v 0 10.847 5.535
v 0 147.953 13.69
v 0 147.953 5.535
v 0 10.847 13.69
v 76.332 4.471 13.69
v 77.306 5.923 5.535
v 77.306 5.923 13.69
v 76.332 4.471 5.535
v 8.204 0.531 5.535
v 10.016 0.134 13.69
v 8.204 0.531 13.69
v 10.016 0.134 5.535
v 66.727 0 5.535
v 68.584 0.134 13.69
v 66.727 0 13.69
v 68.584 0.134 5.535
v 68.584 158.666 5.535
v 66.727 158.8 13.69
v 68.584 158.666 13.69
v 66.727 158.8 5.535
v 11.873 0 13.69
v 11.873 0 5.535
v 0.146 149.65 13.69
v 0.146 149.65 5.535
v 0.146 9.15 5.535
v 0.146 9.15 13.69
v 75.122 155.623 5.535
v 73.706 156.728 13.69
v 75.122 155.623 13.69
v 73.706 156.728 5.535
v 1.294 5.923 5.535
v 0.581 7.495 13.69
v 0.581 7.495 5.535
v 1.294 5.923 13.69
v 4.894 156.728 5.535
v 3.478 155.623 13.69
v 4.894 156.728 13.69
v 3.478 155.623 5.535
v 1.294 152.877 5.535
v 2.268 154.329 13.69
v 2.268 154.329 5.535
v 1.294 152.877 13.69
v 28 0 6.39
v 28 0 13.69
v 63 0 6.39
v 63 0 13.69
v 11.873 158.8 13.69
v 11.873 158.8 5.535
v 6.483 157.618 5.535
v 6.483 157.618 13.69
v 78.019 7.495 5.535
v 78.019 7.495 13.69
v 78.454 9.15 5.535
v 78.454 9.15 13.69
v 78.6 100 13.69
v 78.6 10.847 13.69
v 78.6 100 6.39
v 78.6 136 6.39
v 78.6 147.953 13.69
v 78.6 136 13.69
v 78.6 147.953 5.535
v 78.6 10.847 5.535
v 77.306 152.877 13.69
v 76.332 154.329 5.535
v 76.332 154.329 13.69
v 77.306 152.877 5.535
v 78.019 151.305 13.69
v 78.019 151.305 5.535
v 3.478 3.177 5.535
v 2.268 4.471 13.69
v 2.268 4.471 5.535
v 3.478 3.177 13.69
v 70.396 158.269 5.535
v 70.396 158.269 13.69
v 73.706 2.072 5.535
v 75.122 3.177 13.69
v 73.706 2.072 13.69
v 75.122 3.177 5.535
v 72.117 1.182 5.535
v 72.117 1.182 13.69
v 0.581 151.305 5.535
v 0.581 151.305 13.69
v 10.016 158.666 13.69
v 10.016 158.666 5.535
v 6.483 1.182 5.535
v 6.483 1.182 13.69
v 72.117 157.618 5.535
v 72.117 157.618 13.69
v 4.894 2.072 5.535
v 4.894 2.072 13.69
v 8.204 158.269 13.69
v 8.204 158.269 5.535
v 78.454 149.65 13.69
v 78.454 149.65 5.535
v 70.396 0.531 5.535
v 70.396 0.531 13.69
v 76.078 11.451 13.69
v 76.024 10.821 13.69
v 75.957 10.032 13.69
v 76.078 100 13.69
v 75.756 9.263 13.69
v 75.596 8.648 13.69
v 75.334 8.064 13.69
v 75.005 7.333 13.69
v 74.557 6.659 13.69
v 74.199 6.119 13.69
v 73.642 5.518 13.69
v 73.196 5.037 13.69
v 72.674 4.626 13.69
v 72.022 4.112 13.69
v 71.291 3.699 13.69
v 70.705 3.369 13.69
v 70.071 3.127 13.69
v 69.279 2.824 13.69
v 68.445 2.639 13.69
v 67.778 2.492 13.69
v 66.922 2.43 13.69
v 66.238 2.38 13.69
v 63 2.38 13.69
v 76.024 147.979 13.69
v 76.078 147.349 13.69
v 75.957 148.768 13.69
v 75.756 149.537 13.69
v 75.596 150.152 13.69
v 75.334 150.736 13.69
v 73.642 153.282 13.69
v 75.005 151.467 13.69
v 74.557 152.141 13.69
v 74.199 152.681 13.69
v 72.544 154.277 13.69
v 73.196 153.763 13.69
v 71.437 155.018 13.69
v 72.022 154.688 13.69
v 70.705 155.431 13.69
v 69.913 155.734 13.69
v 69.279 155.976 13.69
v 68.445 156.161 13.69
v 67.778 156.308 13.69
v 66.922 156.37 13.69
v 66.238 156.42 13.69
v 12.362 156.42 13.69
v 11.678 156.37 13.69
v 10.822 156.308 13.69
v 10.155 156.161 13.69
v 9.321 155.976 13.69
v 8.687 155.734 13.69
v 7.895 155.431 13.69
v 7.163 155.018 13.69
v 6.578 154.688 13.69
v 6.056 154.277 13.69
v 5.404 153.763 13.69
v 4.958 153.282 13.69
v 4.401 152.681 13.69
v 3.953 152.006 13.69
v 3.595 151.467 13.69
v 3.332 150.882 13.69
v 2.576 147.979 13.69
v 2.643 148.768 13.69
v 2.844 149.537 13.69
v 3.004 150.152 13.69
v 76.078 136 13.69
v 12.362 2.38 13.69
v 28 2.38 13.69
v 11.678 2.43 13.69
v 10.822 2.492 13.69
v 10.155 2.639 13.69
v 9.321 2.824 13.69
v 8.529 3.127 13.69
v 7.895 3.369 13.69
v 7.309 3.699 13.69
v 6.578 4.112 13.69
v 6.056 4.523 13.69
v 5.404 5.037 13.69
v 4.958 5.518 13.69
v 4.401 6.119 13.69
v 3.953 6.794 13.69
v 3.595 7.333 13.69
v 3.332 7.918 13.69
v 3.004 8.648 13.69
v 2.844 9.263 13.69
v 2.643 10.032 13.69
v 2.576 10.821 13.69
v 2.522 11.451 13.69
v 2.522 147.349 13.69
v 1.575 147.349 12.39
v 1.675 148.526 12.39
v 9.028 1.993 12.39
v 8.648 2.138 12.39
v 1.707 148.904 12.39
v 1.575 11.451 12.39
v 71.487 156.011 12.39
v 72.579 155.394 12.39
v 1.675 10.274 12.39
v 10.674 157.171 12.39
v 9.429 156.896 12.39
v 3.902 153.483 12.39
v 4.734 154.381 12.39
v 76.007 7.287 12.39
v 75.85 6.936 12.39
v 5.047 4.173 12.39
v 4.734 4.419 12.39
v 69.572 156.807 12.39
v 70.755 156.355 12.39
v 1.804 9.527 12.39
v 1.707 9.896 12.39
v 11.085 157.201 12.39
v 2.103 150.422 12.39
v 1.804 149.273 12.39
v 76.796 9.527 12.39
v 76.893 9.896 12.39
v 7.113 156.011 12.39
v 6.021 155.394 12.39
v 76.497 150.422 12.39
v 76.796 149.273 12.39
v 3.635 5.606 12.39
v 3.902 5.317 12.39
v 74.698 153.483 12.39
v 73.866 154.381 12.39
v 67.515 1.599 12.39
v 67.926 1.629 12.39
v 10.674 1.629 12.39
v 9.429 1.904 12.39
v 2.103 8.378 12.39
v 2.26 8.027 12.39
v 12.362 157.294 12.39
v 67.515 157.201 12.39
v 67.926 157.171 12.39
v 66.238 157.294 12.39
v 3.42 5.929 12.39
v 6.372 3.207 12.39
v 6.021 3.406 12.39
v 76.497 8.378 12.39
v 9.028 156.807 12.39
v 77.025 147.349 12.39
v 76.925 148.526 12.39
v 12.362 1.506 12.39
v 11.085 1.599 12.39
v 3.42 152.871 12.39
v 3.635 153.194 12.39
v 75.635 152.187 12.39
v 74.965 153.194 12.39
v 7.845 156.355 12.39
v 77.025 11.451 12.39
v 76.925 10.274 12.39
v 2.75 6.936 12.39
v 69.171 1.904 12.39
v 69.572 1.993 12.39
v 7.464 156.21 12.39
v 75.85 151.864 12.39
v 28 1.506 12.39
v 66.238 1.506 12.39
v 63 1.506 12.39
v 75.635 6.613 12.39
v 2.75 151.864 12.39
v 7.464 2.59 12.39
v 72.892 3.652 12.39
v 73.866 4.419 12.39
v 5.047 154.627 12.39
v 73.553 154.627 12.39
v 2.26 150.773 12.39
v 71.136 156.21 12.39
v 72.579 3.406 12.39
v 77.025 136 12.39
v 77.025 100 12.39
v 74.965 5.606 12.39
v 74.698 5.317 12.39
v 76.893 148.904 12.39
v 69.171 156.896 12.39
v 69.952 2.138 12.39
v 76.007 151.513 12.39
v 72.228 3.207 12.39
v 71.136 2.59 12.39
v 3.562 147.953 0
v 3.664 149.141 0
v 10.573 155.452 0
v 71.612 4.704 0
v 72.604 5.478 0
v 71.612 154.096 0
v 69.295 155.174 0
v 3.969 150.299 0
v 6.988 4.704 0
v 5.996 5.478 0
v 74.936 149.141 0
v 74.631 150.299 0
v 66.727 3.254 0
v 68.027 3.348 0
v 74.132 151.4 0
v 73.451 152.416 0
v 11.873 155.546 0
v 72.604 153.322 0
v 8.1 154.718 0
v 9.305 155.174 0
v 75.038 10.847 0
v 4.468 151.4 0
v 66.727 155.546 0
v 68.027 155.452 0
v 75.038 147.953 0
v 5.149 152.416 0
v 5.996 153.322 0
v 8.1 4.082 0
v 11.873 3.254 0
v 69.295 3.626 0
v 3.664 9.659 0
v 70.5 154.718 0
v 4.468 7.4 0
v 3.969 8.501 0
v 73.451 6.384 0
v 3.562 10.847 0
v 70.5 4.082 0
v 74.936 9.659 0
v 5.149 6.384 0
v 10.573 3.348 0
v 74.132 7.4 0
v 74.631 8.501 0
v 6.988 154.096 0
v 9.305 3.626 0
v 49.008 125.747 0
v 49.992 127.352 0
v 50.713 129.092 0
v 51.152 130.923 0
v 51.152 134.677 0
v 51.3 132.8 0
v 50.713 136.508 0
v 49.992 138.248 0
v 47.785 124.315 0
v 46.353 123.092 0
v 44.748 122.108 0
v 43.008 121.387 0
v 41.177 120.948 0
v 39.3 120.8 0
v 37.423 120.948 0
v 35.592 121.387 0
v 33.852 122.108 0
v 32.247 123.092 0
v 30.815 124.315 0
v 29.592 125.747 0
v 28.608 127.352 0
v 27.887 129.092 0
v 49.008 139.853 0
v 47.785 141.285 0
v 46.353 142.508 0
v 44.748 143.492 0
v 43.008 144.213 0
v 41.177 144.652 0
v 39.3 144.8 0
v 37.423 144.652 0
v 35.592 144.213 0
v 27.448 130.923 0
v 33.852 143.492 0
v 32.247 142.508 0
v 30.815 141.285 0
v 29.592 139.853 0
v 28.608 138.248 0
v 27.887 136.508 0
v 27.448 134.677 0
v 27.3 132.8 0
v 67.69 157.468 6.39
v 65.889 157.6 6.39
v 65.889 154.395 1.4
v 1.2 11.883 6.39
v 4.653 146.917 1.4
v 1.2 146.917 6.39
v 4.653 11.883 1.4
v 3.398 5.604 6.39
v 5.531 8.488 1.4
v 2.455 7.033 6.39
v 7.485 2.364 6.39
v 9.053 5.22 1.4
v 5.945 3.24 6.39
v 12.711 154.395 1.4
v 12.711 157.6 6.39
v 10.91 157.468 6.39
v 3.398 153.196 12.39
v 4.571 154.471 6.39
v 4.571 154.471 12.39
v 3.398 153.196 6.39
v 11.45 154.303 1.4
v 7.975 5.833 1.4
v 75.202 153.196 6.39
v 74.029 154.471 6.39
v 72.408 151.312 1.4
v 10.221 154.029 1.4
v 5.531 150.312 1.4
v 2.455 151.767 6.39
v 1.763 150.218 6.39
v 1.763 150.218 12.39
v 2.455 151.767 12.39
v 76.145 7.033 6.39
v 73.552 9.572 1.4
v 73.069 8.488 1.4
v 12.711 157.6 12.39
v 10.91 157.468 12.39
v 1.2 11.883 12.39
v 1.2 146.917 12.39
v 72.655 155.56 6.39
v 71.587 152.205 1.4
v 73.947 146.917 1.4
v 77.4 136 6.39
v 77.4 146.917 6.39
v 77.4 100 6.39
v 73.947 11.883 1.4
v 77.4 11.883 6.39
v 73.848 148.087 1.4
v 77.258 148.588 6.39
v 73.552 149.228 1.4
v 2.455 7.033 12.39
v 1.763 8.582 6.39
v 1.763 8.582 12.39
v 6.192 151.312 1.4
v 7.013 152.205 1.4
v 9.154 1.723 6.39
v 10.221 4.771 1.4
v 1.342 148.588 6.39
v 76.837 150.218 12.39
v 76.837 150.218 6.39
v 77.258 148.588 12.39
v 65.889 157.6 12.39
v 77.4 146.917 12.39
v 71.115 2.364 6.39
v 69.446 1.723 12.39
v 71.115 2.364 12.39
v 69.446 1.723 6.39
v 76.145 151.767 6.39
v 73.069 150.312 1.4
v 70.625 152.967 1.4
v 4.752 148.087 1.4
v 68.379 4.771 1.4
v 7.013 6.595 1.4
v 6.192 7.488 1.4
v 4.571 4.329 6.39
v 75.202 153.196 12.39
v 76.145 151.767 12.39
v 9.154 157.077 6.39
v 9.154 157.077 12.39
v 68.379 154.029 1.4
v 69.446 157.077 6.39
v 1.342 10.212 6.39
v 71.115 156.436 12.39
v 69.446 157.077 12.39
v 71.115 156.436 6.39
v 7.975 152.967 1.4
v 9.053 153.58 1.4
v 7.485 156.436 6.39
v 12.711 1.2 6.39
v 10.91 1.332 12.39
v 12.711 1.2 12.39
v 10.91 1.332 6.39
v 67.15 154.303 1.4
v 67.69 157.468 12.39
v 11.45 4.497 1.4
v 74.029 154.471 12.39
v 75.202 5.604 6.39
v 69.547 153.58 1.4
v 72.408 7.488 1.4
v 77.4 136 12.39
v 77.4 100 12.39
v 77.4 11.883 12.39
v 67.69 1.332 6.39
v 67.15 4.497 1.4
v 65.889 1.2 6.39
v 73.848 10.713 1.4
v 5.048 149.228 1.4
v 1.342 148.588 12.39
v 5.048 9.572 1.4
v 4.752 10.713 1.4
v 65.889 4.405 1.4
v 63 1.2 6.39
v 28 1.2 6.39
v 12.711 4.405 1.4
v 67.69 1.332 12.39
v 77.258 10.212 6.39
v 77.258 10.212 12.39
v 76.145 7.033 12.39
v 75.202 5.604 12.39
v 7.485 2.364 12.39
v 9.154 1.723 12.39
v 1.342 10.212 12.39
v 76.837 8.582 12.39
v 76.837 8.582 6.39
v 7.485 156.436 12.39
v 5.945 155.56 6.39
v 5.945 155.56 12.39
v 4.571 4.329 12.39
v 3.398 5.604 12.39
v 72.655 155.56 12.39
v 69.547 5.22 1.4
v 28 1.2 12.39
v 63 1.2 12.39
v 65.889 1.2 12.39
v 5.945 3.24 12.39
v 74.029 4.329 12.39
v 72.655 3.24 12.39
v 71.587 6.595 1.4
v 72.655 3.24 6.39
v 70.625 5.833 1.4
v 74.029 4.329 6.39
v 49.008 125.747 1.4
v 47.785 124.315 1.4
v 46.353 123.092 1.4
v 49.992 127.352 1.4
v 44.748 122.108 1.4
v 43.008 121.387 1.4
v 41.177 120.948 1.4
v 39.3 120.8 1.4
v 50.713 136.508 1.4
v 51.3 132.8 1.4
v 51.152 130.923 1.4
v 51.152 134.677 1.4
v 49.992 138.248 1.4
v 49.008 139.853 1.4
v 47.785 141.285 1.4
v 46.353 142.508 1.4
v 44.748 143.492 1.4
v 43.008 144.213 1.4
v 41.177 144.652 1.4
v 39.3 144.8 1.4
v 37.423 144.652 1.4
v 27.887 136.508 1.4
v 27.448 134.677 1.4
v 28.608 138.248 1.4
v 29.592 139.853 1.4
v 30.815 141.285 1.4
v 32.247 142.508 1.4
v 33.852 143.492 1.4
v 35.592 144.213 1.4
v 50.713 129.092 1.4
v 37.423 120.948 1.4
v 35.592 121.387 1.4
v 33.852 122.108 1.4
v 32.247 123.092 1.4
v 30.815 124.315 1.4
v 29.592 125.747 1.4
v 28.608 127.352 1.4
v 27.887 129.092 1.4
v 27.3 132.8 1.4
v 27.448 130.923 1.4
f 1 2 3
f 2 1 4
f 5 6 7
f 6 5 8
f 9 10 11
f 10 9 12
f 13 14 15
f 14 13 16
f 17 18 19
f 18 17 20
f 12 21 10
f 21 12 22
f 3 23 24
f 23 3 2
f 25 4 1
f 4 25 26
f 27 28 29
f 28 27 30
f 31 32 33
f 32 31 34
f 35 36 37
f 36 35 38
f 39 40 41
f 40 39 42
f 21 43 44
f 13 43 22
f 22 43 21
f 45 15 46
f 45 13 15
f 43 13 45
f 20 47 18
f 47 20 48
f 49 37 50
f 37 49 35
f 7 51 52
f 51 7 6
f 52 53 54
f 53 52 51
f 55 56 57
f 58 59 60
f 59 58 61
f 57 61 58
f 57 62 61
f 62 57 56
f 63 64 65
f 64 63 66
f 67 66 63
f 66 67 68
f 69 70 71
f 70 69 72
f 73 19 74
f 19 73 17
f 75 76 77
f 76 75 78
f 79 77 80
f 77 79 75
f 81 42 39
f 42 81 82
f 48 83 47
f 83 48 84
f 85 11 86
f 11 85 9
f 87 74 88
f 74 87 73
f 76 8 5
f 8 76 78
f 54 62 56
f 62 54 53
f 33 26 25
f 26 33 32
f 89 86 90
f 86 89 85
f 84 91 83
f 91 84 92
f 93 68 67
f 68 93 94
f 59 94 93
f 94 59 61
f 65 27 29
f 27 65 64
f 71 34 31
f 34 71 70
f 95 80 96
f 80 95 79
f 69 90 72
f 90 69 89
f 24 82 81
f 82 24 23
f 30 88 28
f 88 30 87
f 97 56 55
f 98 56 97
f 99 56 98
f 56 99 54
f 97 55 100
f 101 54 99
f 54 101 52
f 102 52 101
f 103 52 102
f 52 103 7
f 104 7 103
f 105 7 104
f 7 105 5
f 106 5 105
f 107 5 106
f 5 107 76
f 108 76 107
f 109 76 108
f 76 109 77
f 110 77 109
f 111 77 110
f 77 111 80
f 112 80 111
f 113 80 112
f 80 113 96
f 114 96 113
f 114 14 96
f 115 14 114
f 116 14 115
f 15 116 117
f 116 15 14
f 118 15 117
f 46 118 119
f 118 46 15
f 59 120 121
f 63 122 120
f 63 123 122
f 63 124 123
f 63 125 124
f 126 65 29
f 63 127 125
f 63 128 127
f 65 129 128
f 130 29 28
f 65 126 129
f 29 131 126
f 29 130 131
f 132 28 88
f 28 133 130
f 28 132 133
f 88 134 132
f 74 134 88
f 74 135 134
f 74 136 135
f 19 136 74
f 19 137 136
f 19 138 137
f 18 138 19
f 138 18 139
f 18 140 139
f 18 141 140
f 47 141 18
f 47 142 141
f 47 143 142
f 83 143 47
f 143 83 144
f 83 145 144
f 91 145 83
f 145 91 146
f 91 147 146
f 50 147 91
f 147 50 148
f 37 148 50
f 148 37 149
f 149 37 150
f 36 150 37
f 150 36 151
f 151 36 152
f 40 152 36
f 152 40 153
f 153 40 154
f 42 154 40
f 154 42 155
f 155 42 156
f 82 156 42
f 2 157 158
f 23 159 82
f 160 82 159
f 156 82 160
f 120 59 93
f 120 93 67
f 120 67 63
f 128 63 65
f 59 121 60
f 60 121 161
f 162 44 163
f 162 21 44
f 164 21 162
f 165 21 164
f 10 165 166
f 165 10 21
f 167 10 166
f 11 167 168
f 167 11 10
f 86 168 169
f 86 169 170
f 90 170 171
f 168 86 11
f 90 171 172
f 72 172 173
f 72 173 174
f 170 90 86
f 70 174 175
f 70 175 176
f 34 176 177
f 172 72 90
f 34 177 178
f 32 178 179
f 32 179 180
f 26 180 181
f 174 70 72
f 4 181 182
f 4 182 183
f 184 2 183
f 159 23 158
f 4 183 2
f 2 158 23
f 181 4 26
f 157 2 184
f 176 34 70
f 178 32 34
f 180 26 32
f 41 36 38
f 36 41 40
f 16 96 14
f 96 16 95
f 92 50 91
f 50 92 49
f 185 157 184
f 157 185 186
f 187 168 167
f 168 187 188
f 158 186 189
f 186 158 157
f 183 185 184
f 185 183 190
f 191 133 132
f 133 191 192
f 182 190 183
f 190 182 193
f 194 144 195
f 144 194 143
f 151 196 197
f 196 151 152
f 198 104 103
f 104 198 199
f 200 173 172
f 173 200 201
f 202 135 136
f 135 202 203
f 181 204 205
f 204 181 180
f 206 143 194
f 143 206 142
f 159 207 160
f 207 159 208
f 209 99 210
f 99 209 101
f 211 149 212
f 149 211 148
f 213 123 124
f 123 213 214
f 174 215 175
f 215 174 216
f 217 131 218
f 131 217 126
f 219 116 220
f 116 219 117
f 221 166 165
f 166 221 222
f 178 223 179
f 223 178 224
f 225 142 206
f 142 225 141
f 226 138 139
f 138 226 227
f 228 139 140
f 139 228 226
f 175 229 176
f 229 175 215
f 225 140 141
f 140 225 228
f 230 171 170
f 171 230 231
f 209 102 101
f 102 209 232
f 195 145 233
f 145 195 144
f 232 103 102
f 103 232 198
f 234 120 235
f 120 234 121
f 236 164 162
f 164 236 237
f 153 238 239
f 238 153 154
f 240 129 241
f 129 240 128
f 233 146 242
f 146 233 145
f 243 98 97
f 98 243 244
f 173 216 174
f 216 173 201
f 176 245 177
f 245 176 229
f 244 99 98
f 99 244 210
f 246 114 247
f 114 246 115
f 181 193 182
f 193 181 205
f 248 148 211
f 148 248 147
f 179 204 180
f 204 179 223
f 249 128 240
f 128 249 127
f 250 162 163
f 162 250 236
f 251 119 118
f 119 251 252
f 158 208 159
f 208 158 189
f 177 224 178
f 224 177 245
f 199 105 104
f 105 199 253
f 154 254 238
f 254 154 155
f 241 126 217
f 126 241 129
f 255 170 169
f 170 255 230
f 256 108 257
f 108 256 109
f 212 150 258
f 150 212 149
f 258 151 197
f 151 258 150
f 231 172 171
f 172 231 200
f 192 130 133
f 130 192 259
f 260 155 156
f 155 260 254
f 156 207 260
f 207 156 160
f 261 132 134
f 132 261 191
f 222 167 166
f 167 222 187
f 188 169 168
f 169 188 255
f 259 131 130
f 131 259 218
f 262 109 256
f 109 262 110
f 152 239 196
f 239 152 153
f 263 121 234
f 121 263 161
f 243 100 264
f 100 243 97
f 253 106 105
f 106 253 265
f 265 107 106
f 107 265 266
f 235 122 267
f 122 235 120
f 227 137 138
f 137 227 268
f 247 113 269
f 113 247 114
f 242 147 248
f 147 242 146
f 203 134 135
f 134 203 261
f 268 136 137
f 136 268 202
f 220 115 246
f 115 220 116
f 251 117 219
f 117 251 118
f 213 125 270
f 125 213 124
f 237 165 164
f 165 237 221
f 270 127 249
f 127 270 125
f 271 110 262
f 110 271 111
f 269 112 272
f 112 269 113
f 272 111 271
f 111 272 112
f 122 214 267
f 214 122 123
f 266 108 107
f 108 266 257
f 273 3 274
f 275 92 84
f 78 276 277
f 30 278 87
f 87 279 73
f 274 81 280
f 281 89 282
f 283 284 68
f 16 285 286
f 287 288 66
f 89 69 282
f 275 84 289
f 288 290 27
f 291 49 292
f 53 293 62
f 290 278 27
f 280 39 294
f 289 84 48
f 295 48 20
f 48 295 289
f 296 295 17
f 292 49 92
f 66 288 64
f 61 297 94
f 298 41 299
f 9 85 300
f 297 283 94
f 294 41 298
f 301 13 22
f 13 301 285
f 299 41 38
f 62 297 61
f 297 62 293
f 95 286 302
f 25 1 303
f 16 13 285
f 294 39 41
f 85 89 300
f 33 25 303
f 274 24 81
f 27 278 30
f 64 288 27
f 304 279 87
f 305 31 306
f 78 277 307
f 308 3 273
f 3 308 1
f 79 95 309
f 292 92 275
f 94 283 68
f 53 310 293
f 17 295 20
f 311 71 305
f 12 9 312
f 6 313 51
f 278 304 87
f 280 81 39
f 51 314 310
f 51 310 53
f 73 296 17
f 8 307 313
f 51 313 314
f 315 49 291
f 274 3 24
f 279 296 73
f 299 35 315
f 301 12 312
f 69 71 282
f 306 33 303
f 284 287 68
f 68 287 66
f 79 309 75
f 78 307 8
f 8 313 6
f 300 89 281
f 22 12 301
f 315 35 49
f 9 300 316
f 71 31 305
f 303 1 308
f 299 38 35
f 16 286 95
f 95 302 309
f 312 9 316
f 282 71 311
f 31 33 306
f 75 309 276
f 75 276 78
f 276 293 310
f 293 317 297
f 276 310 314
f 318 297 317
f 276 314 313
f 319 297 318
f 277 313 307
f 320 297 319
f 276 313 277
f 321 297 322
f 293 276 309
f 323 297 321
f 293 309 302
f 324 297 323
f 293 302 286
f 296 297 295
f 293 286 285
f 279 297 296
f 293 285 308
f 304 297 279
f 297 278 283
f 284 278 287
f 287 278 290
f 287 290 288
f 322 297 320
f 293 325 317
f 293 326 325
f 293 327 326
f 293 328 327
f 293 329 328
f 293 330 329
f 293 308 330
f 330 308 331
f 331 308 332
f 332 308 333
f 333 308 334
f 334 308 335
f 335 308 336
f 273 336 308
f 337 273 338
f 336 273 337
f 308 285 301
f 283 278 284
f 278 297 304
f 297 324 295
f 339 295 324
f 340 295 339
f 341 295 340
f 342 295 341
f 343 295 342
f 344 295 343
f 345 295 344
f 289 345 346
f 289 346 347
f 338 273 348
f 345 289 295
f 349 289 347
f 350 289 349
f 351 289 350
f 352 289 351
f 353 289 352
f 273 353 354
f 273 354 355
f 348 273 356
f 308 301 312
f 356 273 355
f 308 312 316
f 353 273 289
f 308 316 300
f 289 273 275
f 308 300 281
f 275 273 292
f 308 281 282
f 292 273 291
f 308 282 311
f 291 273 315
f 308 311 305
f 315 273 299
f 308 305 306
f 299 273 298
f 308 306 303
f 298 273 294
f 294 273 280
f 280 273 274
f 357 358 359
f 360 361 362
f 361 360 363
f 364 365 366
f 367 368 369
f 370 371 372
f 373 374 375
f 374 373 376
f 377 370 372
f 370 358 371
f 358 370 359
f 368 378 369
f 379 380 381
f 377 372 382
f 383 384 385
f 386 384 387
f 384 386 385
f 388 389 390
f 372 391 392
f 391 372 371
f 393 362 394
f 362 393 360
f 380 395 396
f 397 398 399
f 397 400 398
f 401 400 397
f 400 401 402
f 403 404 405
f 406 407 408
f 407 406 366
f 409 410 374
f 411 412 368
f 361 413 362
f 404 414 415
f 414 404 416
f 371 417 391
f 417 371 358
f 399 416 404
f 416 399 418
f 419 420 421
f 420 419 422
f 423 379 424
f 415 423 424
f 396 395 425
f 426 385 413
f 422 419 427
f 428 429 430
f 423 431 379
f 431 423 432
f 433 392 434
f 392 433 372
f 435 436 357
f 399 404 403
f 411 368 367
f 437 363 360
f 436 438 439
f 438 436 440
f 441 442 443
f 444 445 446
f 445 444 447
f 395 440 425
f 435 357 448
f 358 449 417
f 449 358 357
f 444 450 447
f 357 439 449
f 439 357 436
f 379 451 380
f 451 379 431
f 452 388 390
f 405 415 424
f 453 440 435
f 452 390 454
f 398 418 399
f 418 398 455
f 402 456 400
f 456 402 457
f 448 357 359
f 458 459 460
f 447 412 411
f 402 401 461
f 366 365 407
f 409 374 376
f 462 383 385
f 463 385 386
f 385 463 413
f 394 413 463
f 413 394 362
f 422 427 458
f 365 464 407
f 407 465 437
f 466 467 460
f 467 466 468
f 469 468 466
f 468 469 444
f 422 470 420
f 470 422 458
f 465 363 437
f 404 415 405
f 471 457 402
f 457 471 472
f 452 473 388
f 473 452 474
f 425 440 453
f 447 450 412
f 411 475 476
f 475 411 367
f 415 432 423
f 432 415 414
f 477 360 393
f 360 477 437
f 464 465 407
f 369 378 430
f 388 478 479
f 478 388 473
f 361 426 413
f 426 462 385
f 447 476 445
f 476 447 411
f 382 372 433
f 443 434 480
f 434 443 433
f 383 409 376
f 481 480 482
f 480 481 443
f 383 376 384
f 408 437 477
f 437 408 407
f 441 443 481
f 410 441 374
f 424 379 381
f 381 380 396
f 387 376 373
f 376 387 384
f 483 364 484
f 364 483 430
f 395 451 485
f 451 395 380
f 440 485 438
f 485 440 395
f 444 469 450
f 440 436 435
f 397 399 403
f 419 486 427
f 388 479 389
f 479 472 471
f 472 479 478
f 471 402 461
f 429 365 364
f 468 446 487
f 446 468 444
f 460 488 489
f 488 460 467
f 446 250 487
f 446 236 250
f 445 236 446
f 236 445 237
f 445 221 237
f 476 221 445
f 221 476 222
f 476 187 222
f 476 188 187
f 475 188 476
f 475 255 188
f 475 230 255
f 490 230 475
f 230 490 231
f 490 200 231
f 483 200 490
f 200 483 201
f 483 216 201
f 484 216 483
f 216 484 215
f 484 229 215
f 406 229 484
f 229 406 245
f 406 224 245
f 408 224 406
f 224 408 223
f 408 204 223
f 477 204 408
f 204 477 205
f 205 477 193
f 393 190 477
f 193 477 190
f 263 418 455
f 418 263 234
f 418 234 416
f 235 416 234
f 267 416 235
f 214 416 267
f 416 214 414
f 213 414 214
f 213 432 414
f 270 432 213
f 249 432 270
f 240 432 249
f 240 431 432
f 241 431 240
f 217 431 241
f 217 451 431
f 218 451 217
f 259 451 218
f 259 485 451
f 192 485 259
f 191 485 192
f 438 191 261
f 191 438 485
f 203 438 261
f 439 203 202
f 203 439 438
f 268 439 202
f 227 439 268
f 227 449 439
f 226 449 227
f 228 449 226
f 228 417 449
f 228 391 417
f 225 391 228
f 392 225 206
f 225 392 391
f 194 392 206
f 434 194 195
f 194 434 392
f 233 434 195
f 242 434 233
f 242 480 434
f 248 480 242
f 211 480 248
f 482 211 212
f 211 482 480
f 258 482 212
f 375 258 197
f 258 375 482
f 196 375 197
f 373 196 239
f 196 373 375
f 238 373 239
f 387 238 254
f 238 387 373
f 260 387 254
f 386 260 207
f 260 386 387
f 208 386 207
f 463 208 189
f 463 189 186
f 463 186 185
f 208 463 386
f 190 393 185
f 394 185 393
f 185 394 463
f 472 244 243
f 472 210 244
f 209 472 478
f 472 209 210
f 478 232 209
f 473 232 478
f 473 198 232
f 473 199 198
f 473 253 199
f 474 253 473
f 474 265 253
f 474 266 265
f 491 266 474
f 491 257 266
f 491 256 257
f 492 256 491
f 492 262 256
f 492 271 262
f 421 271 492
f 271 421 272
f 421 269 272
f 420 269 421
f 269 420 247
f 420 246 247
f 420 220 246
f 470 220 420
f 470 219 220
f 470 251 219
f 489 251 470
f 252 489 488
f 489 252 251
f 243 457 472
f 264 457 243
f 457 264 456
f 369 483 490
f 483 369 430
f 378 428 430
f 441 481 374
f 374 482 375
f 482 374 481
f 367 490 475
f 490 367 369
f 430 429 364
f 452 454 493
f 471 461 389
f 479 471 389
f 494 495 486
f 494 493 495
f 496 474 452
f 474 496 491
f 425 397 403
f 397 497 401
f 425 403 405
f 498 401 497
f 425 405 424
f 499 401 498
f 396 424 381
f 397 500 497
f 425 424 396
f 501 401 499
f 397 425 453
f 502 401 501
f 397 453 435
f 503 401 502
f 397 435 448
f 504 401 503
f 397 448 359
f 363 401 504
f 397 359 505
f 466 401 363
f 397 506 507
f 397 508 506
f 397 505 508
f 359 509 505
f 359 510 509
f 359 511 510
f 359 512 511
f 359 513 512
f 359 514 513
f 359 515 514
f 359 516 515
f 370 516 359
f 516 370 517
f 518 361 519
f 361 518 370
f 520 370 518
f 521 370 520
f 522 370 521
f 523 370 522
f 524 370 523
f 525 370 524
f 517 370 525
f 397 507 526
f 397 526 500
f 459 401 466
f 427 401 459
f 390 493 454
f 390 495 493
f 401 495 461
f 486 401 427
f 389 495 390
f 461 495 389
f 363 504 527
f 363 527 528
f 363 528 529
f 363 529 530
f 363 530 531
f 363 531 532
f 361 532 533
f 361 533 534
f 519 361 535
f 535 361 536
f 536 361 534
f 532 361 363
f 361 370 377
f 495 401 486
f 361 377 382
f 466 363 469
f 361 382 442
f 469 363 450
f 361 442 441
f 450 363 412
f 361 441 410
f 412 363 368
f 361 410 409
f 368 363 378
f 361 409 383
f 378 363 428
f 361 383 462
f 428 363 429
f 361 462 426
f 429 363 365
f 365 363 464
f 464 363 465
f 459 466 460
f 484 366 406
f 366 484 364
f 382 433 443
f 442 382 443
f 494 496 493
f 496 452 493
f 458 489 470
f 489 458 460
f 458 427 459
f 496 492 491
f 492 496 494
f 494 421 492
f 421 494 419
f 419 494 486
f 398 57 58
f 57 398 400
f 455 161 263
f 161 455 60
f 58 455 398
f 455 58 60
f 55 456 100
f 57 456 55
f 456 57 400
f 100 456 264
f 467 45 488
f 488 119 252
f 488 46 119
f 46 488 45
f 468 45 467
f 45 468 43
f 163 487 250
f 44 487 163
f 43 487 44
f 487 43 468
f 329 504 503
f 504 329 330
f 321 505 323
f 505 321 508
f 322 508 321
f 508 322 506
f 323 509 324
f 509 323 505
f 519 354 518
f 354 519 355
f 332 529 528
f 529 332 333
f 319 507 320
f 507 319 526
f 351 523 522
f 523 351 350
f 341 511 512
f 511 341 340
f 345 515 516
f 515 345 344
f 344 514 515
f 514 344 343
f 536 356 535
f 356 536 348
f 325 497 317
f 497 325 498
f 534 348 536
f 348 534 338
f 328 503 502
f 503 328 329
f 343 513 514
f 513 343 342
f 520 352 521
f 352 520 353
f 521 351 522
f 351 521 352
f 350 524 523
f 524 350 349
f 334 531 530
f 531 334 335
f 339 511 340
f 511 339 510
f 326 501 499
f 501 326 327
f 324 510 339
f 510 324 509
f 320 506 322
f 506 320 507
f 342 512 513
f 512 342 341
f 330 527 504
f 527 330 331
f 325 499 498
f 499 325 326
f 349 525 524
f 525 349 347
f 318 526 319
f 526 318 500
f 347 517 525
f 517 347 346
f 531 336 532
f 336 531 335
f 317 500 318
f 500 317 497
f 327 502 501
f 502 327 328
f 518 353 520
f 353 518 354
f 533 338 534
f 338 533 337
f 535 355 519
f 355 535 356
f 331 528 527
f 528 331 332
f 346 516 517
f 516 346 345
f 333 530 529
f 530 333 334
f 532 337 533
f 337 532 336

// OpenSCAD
// [Dimensions]

// Phone Height
h=156.4;
// Phone Width
w=76.2;
// Phone Tickness
phoneTickness=6;
// Snap Tickness
snapTickness=4.99;

// [Hidden]
tickness=phoneTickness + snapTickness;
topBorder = 1.4;
topHeight = 1.5;
shell = 1.2;
cameraRad = 12;
caseW = w+2*shell;
caseH = h+2*shell;
caseT = tickness+shell;
$fn=40;

module baseShape(t = tickness, bottomRatio=0.95, topRatio=1) {
    d = 10;
    resize([w, h, t])
    hull() {
        translate([d, d, 0])
        cylinder(h=t, r1=d* bottomRatio, r2=d * topRatio);

        translate([d, h-2*d, 0])
        cylinder(h=t, r1=d* bottomRatio, r2=d * topRatio);

        translate([w-2*d, h-2*d, 0])
        cylinder(h=t, r1=d * bottomRatio, r2=d * topRatio);

        translate([w-2*d, d, 0])
        cylinder(h=t, r1=d * bottomRatio, r2=d * topRatio);
    }
}

module phone() {
    hull() {
        baseShape(t=snapTickness, bottomRatio=0.7);
        
        translate([0, 0, snapTickness])
        baseShape(t=phoneTickness, bottomRatio=1);
    }
}

module topBorder() {
    color("#0ABAB5")
    difference() {
        translate([0, 0, caseT])
        resize(newsize=[caseW, caseH, topHeight])
        baseShape(t=topHeight, bottomRatio=1);
        
        translate([topBorder/2, topBorder/2, caseT-1])
        resize(newsize=[caseW-topBorder, caseH-topBorder, 4])
        baseShape(t=4, bottomRatio=1, topRatio=0.75);
    }
}

color("#0ABAB5")
difference() {    
    // Build the basic phone shell bounding box
    union() {
        resize(newsize=[caseW, caseH, caseT]) phone();
        topBorder();
    }
    
    // Cut the phone interior
    translate([shell, shell, shell+0.2]) phone();
    
    // Cut button holes
    translate([caseW-5, 100, snapTickness + shell + 0.2])
    cube([6, 36, phoneTickness+topHeight]);
    
    translate([28, -1, snapTickness + shell + 0.2])
    cube([35, 6, phoneTickness+topHeight]);
    
    // Cut camera hole
    translate([caseW/2, caseH-cameraRad-14, -1])
    cylinder(h = tickness, r1=cameraRad, r2=cameraRad);
};
